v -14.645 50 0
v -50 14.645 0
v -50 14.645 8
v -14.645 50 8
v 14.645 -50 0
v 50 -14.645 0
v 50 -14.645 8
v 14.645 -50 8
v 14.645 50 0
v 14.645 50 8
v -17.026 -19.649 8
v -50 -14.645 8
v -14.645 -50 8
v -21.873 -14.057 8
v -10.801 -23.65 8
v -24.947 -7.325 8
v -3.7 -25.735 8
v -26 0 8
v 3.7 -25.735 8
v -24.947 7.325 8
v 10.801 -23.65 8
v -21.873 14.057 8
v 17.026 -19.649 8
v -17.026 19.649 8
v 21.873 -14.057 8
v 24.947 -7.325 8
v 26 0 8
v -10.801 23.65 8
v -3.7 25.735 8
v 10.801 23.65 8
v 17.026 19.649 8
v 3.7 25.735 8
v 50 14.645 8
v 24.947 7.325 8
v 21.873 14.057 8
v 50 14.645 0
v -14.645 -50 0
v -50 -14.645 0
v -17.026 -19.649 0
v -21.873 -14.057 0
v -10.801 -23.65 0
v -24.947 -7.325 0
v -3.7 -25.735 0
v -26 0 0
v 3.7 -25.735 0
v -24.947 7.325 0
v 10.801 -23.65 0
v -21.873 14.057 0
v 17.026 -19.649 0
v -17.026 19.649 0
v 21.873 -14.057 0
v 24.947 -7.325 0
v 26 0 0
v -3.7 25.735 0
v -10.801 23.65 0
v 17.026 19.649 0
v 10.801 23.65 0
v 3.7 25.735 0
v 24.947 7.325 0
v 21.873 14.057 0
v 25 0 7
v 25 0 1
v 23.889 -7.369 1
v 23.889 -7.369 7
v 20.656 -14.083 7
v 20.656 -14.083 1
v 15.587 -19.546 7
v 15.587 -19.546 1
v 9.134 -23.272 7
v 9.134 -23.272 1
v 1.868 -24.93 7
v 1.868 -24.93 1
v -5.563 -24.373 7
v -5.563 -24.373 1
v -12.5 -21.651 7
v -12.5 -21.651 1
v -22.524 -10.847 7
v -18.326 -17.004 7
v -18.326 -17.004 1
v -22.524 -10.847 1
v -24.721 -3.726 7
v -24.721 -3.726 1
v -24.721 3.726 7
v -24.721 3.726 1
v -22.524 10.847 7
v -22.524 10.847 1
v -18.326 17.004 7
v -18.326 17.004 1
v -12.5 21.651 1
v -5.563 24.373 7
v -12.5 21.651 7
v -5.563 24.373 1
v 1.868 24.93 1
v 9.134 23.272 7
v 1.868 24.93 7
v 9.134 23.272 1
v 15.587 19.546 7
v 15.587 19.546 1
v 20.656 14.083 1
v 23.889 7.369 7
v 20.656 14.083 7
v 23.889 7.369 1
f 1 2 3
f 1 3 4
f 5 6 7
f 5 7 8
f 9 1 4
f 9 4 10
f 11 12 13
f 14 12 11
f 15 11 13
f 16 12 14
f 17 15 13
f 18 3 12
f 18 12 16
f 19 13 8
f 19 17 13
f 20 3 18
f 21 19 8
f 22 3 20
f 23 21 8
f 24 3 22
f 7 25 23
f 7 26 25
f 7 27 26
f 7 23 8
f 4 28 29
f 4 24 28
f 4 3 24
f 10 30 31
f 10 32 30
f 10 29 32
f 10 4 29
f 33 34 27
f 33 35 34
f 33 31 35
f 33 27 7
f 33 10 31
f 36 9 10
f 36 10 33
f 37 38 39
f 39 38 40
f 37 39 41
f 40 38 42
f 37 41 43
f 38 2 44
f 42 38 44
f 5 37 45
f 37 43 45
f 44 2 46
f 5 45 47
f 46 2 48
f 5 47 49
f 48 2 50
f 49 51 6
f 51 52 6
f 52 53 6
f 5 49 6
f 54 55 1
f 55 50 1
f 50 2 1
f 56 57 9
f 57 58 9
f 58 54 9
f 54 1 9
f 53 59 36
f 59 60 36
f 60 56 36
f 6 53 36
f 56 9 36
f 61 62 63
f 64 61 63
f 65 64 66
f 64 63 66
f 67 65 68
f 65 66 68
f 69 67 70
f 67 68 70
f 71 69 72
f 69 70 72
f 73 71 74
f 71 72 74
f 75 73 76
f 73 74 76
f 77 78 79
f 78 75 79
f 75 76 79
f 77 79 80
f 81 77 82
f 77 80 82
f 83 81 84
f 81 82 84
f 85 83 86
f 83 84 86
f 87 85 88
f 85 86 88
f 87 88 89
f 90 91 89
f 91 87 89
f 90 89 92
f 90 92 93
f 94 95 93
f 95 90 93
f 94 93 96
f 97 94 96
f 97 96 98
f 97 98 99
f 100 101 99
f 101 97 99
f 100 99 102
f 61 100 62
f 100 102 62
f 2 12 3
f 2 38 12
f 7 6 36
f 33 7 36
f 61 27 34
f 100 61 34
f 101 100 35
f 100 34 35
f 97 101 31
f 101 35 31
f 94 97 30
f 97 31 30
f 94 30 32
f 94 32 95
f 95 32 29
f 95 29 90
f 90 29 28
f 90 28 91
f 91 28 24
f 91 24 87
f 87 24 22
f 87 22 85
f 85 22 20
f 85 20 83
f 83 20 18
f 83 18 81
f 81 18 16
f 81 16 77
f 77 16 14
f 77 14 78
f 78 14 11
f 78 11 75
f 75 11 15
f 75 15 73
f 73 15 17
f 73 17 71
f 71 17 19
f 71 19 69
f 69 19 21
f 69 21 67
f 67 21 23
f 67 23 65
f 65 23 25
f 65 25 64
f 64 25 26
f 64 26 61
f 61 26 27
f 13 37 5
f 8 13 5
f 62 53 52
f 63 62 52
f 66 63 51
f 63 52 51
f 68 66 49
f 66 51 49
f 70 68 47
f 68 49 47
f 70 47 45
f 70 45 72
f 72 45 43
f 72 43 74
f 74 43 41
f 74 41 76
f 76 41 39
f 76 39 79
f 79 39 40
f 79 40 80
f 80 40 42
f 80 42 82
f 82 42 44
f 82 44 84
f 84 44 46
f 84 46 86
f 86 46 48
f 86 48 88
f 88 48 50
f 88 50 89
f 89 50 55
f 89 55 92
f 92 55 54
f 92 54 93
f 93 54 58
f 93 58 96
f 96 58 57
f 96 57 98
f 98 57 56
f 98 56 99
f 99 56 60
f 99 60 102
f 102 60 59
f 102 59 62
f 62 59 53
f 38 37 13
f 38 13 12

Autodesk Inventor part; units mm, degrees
ref_plane "YZ Plane" through (0, 0, 0) normal (1, 0, 0) x (0, 1, 0)
ref_plane "XZ Plane" through (0, 0, 0) normal (0, 1, 0) x (-1, 0, 0)
ref_plane "XY Plane" through (0, 0, 0) normal (0, 0, 1) x (1, 0, 0)
sketch "Esquisse1" plane through (0, 0, 0) normal (0, 0, 1) x (1, 0, 0)
  circle A0 centre (0, 0) radius 25
  line L0 (-50, 14.6447) -> (-14.6447, 50)
  line L1 (14.6447, 50) -> (50, 14.6447)
  line L2 (50, -14.6447) -> (14.6447, -50)
  line L3 (-14.6447, -50) -> (-50, -14.6447)
  line L4 (-70, 0) -> (70, 0) construction
  line L5 (0, -70) -> (0, 70) construction
  line L6 (50, -14.6447) -> (50, 14.6447)
  line L7 (-50, -14.6447) -> (-50, 14.6447)
  line L8 (-14.6447, 50) -> (14.6447, 50)
  line L9 (-14.6447, -50) -> (14.6447, -50)
  dimension "d0" = 50
  dimension "d9" = 100
  dimension "d11" = 45
  dimension "d12" = 50
  dimension "d13" = 100
  dimension "d14" = 50
  dimension "d15" = 50
extrude "Extrusion1" add sketch "Esquisse1" along normal blind 8
chamfer "Chanfrein1" distance 1 angle 45 2 edges at (-25, 0, 8) (-25, 0, 0)
equation "\"d12\" = 0.5 * d9"
equation "\"d13\" = d9"
equation "\"d14\" = 0.5 * d13"
properties part number "support_bois_reservoir"
